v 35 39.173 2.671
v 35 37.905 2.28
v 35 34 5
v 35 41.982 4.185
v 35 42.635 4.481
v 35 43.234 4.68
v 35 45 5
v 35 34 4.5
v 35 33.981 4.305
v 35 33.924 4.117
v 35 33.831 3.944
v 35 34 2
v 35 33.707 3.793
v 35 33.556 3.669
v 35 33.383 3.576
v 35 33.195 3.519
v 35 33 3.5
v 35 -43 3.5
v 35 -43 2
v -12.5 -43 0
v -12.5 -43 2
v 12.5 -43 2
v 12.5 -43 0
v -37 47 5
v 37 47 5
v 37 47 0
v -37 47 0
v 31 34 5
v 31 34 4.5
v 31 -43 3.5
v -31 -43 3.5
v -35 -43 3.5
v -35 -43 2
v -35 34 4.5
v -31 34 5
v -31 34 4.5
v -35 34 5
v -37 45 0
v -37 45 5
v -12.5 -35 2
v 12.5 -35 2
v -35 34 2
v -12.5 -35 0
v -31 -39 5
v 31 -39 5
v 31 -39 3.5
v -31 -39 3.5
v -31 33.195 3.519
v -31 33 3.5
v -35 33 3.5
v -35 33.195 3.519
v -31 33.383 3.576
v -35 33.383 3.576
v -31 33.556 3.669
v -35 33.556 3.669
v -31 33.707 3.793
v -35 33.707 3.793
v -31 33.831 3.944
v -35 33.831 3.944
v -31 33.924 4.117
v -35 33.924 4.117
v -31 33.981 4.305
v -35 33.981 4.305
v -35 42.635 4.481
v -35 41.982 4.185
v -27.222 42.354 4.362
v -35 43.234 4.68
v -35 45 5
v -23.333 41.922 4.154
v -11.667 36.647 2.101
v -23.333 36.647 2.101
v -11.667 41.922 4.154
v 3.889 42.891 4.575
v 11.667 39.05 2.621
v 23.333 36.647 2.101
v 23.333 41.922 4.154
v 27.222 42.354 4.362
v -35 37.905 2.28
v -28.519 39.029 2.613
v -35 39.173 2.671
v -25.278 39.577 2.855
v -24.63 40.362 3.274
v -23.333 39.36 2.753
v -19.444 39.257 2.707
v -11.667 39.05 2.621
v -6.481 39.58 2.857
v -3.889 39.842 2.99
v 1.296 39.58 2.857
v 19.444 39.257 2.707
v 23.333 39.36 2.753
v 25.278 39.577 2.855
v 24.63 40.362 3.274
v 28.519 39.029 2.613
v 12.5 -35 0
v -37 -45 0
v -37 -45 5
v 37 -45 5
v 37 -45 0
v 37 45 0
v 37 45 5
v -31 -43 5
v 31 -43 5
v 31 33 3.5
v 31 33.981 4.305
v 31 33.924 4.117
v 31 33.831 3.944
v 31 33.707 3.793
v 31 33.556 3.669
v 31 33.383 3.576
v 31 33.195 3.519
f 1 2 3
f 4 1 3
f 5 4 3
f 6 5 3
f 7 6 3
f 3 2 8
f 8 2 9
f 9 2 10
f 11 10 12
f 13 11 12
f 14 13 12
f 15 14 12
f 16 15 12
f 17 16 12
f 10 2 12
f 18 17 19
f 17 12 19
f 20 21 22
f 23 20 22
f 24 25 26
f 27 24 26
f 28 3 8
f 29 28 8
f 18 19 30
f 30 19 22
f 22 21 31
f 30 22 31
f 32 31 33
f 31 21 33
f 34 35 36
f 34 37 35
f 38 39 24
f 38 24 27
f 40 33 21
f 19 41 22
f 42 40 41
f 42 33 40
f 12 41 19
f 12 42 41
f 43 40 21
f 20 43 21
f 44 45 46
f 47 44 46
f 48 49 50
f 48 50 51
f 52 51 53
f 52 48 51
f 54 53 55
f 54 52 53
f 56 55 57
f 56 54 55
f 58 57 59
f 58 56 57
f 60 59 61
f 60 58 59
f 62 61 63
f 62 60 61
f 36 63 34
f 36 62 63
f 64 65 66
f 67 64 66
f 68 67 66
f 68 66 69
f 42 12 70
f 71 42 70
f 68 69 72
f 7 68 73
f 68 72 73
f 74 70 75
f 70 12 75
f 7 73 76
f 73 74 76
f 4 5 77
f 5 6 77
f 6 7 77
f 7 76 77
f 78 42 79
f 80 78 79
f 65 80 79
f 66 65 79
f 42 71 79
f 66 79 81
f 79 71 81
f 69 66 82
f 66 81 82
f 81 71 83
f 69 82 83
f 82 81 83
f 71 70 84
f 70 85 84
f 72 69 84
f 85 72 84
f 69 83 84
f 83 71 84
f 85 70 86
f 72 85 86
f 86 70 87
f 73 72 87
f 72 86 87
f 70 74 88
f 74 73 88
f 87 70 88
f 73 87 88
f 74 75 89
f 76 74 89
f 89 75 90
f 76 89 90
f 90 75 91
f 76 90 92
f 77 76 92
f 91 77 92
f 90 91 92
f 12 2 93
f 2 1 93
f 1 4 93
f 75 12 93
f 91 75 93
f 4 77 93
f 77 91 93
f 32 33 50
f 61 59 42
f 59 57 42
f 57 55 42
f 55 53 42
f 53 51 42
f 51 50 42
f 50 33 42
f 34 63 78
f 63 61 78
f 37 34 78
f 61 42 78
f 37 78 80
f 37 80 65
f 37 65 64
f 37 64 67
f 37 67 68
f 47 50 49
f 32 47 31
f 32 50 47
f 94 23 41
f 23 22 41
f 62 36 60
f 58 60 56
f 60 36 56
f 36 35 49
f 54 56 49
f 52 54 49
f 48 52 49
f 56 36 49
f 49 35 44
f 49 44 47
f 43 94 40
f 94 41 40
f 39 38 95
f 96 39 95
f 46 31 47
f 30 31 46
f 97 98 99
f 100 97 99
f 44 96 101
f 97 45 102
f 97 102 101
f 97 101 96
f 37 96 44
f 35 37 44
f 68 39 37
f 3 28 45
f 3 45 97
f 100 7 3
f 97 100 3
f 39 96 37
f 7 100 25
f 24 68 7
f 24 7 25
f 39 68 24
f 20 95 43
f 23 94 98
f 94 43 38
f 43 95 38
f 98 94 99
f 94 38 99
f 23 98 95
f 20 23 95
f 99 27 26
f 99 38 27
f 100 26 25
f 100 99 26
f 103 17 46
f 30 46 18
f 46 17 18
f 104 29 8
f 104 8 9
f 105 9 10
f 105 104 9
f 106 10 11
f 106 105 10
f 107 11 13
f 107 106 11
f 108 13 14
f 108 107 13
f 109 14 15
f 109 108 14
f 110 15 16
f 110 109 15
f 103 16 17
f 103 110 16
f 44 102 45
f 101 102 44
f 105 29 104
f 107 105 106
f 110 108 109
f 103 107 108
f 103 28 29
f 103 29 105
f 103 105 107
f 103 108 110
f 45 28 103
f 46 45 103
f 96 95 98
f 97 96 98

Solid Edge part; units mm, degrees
sketch "Sketch1" plane through (0, 0, 0) normal (0, 0, 1) x (1, 0, 0)
  line L0 (-37, -45) -> (37, -45)
  line L1 (37, -45) -> (37, 45)
  line L2 (37, 45) -> (-37, 45)
  line L3 (-37, 45) -> (-37, -45)
  dimension "D1" = 74
  dimension "D2" = 90
extrude "Protrusion1" add sketch "Sketch1" along normal blind 2
sketch "Sketch2" plane through (0, 0, 2) normal (0, 0, 1) x (1, 0, 0)
  line L0 (-35, -43) -> (-35, 45)
  line L1 (-35, 45) -> (-37, 45)
  line L2 (-37, 45) -> (-37, -45)
  line L3 (37, -45) -> (-37, -45)
  line L4 (37, -45) -> (37, 45)
  line L5 (37, 45) -> (35, 45)
  line L6 (35, 45) -> (35, -43)
  line L7 (35, -43) -> (-35, -43)
extrude "ExtrudedProtrusion_2" add sketch "Sketch2" along normal blind 3
sketch "Sketch3" plane through (35, 1, 3.5) normal (-1, 0, 0) x (0, -1, 0)
  line L0 (44, 1.5) -> (-33, 1.5)
  line L1 (-33, 1.5) -> (-33, 0)
  line L2 (-33, 0) -> (44, 0)
  line L3 (44, 0) -> (44, 1.5)
extrude "ExtrudedProtrusion_3" add sketch "Sketch3" along normal blind 4
sketch "Sketch4" plane through (-35, 1, 3.5) normal (1, 0, 0) x (0, 1, 0)
  line L0 (-44, 1.5) -> (33, 1.5)
  line L1 (33, 1.5) -> (33, 0)
  line L2 (33, 0) -> (-44, 0)
  line L3 (-44, 0) -> (-44, 1.5)
extrude "ExtrudedProtrusion_4" add sketch "Sketch4" along normal blind 4
sketch "Sketch5" plane through (35, 1, 3.5) normal (-1, 0, 0) x (0, -1, 0)
  spline S0 degree 3 poles (-33, -1.5) (-34.865, -1.4464) (-37.9174, -1.5297) (-41.2071, 1.135) (-43.2352, 1.3829) (-44, 1.5) knots 0 0 0 0 0.440598 0.817285 1 1 1 1
  line L0 (-44, -1.5) -> (-33, -1.5)
  line L1 (-44, 1.5) -> (-44, -1.5)
extrude "ExtrudedProtrusion_5" add sketch "Sketch5" along normal blind 70
fillet "Round_5" radius 1 2 edges at (33, 34, 3.5) (-33, 34, 3.5)
sketch "Sketch6" plane through (0, 45, 2.5) normal (0, 1, 0) x (-1, 0, 0)
  line L0 (37, -2.5) -> (-37, -2.5)
  line L1 (-37, -2.5) -> (-37, 2.5)
  line L2 (-37, 2.5) -> (37, 2.5)
  line L3 (37, 2.5) -> (37, -2.5)
extrude "ExtrudedProtrusion_6" add sketch "Sketch6" along normal blind 2
sketch "Sketch7" plane through (0, -4.5, 2) normal (0, 0, 1) x (1, 0, 0)
  line L0 (12.5, -30.5) -> (-12.5, -30.5)
  line L1 (-12.5, -30.5) -> (-12.5, -38.5)
  line L2 (-12.5, -38.5) -> (12.5, -38.5)
  line L3 (12.5, -38.5) -> (12.5, -30.5)
  dimension "D1" = 8
  dimension "D2" = 25
extrude "ExtrudedCutout_1" cut sketch "Sketch7" against normal blind 2
sketch "Sketch8" plane through (0, -43, 2.5) normal (0, 1, 0) x (1, 0, 0)
  line L0 (-31, -1) -> (31, -1)
  line L1 (31, -1) -> (31, -2.5)
  line L2 (31, -2.5) -> (-31, -2.5)
  line L3 (-31, -2.5) -> (-31, -1)
extrude "ExtrudedProtrusion_7" add sketch "Sketch8" along normal blind 4
